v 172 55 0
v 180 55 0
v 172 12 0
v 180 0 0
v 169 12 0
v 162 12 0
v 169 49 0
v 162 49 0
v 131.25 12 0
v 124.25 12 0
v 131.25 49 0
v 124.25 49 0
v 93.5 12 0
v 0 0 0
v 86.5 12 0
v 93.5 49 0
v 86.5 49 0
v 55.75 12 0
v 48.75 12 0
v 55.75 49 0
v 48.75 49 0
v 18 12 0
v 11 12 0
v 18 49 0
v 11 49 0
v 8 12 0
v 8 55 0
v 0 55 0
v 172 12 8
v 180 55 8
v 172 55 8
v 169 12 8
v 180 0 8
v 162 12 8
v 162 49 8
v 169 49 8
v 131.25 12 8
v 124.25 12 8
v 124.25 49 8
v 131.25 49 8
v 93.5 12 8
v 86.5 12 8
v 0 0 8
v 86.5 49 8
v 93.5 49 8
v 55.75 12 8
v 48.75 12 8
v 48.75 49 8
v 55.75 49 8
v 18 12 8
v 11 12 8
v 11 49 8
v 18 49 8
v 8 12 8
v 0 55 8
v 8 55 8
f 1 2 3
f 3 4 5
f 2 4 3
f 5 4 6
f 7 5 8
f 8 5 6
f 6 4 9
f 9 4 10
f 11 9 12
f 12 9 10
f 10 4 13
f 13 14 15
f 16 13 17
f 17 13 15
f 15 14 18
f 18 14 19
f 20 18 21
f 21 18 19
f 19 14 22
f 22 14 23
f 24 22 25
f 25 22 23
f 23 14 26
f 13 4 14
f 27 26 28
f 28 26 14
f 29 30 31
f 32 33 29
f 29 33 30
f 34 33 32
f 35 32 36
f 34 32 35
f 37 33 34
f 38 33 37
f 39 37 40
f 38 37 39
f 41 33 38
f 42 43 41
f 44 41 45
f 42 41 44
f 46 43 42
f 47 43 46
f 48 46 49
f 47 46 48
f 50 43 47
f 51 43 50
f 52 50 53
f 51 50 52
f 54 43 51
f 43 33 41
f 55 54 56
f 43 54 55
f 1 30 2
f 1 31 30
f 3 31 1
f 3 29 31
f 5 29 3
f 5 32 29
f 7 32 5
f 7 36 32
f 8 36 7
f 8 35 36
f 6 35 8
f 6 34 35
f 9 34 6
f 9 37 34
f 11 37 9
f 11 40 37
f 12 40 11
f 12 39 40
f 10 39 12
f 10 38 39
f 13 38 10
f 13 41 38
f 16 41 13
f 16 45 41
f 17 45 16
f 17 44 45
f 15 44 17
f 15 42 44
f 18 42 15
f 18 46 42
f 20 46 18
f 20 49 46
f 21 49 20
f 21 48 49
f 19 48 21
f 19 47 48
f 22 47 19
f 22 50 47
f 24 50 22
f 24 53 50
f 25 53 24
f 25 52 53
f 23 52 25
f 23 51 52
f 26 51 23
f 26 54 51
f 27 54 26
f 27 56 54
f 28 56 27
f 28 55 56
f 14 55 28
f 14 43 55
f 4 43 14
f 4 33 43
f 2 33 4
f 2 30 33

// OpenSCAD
$fn = 32;

// ----------------------------------------------------------------------
// Guard grille: 5 slats over a 180 x 55 mm plate
// ----------------------------------------------------------------------

// --- parameters (mm) ---
profile_height = 8;       // extrusion height
profile_points = 28;      // points of the closed outline

profile = [[0, 0], [180, 0], [180, 55], [172, 55], [172, 12], [169, 12], [169, 49], [162, 49], [162, 12], [131.25, 12], [131.25, 49], [124.25, 49], [124.25, 12], [93.5, 12], [93.5, 49], [86.5, 49], [86.5, 12], [55.75, 12], [55.75, 49], [48.75, 49], [48.75, 12], [18, 12], [18, 49], [11, 49], [11, 12], [8, 12], [8, 55], [0, 55]];  // single closed polygon, 28 points, counter clockwise

// --- the one profile operation ---
linear_extrude(height = profile_height) polygon(points = profile);
